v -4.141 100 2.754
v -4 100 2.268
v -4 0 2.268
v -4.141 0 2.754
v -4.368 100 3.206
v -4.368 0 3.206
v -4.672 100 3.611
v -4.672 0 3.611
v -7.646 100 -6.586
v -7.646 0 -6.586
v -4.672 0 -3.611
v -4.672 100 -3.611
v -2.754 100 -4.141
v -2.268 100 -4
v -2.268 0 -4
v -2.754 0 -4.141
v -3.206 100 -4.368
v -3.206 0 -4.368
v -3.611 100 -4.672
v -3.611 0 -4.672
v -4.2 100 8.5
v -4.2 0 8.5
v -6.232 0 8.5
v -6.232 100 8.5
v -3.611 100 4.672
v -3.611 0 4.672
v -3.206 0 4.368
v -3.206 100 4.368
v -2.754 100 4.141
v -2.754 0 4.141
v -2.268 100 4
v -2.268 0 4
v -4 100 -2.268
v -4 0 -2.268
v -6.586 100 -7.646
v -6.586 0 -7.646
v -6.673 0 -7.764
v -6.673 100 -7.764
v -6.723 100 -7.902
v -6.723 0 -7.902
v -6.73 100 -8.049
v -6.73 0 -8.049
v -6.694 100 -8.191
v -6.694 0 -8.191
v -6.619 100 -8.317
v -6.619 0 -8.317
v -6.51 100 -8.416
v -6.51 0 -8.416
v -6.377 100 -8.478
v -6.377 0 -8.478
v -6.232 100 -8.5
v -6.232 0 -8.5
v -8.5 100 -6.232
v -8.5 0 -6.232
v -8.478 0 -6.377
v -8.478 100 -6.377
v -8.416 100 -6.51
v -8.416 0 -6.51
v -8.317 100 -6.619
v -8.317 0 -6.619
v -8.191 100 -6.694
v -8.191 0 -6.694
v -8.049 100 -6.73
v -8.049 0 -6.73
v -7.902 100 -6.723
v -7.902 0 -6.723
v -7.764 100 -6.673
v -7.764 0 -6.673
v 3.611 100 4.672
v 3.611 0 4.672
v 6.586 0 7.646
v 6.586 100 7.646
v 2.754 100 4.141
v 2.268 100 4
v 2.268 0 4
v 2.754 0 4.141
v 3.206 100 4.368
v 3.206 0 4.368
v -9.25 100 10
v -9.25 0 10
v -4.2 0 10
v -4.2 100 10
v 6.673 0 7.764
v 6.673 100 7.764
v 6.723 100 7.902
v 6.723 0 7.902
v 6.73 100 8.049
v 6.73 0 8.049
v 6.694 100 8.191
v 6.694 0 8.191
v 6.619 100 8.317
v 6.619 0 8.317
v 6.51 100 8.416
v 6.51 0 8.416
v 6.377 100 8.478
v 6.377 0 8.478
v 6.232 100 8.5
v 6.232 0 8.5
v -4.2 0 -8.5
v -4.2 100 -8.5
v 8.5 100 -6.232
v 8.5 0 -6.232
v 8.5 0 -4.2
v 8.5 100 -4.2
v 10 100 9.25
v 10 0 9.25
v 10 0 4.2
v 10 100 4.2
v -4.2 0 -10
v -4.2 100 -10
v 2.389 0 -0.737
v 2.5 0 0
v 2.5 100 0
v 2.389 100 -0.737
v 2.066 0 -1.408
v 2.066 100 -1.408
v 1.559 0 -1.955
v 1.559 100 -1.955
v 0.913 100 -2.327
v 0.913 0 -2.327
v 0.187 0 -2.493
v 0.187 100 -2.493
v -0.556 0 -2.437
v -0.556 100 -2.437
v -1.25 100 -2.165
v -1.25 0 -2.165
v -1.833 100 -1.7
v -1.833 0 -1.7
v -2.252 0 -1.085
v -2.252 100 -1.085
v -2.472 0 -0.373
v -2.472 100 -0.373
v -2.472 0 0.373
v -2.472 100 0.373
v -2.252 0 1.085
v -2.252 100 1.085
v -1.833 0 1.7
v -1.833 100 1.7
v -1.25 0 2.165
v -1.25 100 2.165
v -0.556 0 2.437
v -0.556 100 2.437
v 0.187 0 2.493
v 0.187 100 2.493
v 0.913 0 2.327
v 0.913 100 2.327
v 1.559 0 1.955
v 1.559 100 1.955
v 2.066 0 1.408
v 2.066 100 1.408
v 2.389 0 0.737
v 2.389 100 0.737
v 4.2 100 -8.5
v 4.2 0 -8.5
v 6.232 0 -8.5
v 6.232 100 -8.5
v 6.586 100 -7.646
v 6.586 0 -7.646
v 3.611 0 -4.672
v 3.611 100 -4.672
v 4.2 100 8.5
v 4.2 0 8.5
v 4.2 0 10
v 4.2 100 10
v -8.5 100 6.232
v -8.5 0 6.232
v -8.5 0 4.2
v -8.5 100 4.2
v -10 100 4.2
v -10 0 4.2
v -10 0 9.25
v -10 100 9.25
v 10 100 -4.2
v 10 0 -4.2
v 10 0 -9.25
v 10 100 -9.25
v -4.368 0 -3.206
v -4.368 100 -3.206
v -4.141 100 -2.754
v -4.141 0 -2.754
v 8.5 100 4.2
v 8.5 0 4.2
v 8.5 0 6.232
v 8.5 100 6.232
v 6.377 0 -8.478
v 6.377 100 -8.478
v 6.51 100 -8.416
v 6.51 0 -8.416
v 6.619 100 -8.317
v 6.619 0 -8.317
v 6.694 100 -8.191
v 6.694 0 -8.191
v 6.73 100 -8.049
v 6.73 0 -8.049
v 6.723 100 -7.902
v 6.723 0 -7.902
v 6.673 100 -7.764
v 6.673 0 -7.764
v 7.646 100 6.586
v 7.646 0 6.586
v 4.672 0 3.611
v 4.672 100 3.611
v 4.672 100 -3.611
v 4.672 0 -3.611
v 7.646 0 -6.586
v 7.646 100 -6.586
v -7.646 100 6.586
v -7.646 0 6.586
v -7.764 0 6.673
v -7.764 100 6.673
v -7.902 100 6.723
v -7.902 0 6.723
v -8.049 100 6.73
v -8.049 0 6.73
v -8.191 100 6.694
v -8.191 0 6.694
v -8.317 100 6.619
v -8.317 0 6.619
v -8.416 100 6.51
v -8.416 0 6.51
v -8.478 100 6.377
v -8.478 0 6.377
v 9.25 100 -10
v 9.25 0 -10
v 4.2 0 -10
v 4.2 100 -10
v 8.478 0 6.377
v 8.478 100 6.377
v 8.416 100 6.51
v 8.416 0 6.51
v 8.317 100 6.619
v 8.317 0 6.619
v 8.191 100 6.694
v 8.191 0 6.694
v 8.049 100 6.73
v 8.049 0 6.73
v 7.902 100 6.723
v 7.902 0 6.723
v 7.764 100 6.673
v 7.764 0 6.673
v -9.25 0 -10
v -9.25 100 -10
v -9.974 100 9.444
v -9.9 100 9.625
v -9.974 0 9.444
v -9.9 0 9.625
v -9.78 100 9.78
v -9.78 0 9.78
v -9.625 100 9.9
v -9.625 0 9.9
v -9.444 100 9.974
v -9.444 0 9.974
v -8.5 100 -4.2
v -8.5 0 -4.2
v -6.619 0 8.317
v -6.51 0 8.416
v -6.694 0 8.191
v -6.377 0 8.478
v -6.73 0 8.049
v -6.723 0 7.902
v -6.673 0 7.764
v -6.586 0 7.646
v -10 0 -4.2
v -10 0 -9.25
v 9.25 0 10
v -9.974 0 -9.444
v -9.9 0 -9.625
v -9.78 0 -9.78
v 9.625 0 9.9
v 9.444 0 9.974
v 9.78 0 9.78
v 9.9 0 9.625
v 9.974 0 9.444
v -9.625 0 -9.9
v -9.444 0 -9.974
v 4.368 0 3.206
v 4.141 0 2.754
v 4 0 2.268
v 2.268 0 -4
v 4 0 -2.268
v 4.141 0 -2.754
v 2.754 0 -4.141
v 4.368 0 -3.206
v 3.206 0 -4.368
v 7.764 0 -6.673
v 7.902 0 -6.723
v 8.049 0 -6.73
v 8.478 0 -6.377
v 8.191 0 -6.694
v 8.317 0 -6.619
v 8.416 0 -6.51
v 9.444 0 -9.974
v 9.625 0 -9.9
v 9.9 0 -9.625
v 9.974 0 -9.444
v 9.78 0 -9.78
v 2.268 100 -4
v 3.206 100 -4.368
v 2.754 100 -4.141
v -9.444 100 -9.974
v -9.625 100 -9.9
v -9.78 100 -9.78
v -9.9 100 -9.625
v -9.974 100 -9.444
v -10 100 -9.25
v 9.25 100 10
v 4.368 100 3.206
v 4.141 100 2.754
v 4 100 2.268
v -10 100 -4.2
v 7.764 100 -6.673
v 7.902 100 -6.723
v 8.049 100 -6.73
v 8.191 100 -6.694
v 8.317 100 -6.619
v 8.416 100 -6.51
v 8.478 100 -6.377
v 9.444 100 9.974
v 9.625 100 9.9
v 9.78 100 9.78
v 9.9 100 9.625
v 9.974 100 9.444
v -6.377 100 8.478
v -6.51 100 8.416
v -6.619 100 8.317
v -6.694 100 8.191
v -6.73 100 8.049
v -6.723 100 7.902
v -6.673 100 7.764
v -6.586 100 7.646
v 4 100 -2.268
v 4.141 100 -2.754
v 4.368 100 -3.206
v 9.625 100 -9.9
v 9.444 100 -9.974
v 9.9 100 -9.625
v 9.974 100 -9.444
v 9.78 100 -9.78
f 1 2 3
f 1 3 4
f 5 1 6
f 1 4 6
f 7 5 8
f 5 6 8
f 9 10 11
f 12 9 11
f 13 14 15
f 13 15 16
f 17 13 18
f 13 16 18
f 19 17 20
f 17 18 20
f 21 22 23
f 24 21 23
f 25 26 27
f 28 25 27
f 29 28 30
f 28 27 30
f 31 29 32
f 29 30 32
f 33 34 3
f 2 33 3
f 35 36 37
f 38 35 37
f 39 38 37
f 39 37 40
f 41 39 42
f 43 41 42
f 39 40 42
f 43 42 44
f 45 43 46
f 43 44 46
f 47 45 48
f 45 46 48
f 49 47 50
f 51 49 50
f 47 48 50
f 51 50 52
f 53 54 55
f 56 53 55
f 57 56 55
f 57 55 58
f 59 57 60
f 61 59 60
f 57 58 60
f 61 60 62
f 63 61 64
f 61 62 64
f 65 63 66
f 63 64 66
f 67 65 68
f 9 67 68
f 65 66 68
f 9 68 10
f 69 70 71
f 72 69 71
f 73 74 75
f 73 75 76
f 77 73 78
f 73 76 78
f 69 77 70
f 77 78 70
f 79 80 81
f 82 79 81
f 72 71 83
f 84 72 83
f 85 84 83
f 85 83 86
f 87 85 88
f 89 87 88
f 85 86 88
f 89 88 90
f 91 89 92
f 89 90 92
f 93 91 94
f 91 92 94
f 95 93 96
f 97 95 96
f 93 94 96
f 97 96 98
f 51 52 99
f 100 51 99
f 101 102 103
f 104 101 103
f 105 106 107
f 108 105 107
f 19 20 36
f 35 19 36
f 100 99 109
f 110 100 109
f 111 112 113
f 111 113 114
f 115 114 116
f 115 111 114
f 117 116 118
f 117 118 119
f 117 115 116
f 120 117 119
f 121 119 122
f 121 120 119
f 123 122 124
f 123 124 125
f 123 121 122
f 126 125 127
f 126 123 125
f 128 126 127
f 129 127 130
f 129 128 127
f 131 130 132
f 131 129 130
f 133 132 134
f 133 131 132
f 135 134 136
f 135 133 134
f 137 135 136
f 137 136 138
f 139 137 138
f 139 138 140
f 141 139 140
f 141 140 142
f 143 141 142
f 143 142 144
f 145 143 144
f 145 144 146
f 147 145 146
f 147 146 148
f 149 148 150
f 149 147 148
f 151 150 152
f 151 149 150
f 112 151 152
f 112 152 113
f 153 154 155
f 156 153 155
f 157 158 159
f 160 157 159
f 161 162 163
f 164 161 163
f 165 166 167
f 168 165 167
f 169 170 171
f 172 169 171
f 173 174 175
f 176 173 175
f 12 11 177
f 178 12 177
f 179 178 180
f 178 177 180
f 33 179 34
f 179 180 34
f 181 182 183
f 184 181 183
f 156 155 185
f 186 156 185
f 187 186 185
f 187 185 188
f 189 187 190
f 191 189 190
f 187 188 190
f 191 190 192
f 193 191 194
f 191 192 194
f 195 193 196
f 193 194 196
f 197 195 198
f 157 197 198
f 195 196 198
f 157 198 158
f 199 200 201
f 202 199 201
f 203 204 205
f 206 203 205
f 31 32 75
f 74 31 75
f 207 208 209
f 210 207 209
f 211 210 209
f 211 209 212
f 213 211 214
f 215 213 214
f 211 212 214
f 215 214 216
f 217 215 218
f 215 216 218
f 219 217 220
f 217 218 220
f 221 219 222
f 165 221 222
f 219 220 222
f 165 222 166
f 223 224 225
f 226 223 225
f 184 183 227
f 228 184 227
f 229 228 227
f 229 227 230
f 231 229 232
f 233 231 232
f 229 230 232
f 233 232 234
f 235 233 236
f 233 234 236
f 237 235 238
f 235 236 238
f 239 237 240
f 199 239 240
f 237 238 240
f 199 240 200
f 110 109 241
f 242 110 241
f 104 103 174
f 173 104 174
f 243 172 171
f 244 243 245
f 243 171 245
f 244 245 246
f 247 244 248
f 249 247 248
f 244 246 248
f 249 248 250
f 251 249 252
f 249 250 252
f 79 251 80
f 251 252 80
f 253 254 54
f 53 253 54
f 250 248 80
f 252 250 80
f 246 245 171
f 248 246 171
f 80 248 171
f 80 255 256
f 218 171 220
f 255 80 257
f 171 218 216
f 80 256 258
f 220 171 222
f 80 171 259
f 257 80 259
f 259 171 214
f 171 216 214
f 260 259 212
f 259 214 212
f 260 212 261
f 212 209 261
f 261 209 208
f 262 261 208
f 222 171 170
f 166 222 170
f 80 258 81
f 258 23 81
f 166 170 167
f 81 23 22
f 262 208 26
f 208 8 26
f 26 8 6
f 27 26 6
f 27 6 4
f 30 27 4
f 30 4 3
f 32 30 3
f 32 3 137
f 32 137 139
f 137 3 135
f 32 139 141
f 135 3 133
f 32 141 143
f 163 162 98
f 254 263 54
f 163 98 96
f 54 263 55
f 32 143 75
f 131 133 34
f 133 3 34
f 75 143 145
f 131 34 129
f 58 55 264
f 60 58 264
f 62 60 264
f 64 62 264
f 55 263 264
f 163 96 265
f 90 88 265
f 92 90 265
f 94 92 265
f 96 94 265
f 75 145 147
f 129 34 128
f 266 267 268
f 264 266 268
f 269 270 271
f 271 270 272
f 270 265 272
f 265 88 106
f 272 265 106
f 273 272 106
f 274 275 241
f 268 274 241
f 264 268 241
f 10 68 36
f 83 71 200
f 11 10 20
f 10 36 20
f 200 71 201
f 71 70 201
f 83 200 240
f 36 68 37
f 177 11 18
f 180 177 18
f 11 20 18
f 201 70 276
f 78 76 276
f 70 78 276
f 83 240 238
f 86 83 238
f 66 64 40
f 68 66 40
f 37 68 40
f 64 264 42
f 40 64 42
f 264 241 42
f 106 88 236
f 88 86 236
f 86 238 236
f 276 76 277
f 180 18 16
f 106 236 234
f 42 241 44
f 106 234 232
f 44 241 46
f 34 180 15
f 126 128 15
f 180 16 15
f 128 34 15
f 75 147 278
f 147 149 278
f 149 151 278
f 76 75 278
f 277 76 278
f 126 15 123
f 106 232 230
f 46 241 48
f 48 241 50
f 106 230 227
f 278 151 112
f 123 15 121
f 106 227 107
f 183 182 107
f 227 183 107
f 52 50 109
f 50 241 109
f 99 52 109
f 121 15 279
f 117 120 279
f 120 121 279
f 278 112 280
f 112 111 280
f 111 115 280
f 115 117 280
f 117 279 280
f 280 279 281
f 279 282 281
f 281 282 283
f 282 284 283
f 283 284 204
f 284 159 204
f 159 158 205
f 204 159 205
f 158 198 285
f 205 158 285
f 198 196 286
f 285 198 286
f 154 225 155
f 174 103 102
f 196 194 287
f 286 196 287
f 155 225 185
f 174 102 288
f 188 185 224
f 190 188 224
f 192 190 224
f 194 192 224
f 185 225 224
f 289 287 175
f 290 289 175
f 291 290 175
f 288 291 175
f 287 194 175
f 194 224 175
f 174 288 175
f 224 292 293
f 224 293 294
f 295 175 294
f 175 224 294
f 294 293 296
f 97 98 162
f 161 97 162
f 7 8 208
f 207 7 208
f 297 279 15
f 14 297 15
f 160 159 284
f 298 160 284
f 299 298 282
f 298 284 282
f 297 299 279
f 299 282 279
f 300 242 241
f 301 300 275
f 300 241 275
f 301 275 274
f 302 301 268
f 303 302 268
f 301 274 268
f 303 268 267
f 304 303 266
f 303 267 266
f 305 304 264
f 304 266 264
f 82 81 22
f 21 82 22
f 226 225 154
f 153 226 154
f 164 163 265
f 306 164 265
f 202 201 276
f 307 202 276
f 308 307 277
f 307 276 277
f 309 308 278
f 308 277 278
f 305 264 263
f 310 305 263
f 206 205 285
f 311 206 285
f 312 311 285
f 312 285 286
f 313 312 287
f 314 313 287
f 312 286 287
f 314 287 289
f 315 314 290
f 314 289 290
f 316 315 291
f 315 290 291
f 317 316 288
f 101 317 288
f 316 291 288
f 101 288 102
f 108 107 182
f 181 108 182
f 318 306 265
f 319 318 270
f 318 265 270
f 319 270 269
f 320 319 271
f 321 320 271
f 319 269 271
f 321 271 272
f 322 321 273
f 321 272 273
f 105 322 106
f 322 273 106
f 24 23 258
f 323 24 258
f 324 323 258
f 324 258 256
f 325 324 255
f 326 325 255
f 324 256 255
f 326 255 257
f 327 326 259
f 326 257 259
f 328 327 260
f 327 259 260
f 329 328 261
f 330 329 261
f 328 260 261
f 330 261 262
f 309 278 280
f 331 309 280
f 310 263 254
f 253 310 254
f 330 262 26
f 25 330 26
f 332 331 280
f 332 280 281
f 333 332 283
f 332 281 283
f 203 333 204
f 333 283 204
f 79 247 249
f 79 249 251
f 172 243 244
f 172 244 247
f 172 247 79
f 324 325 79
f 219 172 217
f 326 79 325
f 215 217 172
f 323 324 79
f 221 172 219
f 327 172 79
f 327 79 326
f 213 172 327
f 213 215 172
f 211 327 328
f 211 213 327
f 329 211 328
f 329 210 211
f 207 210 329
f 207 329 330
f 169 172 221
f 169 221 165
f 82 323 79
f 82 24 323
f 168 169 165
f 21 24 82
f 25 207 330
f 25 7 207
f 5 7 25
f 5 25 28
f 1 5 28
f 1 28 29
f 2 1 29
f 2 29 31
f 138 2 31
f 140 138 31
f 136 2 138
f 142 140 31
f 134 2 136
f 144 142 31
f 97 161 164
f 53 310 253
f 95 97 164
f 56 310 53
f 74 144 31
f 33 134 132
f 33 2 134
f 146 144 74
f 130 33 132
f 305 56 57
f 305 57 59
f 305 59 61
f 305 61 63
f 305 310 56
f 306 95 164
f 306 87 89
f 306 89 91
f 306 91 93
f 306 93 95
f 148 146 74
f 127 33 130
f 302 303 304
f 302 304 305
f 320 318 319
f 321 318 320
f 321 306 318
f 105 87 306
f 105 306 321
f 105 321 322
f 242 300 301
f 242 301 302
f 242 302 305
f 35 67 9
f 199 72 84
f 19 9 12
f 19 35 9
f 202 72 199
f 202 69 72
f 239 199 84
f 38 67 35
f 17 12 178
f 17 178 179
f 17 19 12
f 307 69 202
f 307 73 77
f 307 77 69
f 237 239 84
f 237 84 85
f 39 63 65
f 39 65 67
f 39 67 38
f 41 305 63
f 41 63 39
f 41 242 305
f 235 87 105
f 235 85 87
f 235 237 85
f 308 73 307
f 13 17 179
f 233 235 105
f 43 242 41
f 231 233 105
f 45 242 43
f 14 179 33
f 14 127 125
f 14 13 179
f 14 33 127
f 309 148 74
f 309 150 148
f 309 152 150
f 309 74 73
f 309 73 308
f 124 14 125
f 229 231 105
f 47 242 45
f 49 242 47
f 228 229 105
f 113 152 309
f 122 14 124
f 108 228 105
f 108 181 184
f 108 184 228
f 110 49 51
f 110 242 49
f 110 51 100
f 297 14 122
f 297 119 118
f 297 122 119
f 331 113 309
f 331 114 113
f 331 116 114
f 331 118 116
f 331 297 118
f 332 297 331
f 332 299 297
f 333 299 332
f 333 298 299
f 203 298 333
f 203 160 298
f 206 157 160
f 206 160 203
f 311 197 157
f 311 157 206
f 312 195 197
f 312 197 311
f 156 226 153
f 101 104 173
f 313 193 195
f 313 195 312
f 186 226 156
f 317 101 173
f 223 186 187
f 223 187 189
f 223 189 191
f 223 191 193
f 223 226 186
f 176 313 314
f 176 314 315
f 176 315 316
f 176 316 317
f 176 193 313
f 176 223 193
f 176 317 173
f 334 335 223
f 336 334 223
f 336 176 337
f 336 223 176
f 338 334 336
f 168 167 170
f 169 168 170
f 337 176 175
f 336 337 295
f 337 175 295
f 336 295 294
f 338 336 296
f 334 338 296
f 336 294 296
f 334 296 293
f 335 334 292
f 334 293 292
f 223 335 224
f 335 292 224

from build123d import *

# Parameters (mm, degrees)
SKETCH1_R           = 2.5
BOSS_EXTRUDE1_DEPTH = 100


with BuildPart() as part:
    # Sketch1 → Boss-Extrude1 (new body)
    with BuildSketch(Plane(origin=(0, 0, 0), x_dir=(1, 0, 0), z_dir=(0, 1, 0))):
        with BuildLine():
            Line((-3.610984523, 4.671644695), (-6.585786438, 7.646446609))
            ThreePointArc((-6.585786438, 7.646446609), (-6.694172813, 8.191341716), (-6.232233047, 8.5))
            Line((-6.232233047, 8.5), (-4.2, 8.5))
            Line((-4.2, 8.5), (-4.2, 10))
            Line((-4.2, 10), (-9.25, 10))
            ThreePointArc((-9.25, 10), (-9.780330086, 9.780330086), (-10, 9.25))
            Line((-10, 9.25), (-10, 4.2))
            Line((-10, 4.2), (-8.5, 4.2))
            Line((-8.5, 4.2), (-8.5, 6.232233047))
            ThreePointArc((-8.5, 6.232233047), (-8.191341716, 6.694172813), (-7.646446609, 6.585786438))
            Line((-7.646446609, 6.585786438), (-4.671644695, 3.610984523))
            ThreePointArc((-4.671644695, 3.610984523), (-4.244383234, 2.985253206), (-4, 2.268058063))
            Line((-4, 2.268058063), (-4, -2.268058063))
            ThreePointArc((-4, -2.268058063), (-4.244383234, -2.985253206), (-4.671644695, -3.610984523))
            Line((-4.671644695, -3.610984523), (-7.646446609, -6.585786438))
            ThreePointArc((-7.646446609, -6.585786438), (-8.191341716, -6.694172813), (-8.5, -6.232233047))
            Line((-8.5, -6.232233047), (-8.5, -4.2))
            Line((-8.5, -4.2), (-10, -4.2))
            Line((-10, -4.2), (-10, -9.25))
            ThreePointArc((-10, -9.25), (-9.780330086, -9.780330086), (-9.25, -10))
            Line((-9.25, -10), (-4.2, -10))
            Line((-4.2, -10), (-4.2, -8.5))
            Line((-4.2, -8.5), (-6.232233047, -8.5))
            ThreePointArc((-6.232233047, -8.5), (-6.694172813, -8.191341716), (-6.585786438, -7.646446609))
            Line((-6.585786438, -7.646446609), (-3.610984523, -4.671644695))
            ThreePointArc((-3.610984523, -4.671644695), (-2.985253206, -4.244383234), (-2.268058063, -4))
            Line((-2.268058063, -4), (2.268058063, -4))
            ThreePointArc((2.268058063, -4), (2.985253206, -4.244383234), (3.610984523, -4.671644695))
            Line((3.610984523, -4.671644695), (6.585786438, -7.646446609))
            ThreePointArc((6.585786438, -7.646446609), (6.694172813, -8.191341716), (6.232233047, -8.5))
            Line((6.232233047, -8.5), (4.2, -8.5))
            Line((4.2, -8.5), (4.2, -10))
            Line((4.2, -10), (9.25, -10))
            ThreePointArc((9.25, -10), (9.780330086, -9.780330086), (10, -9.25))
            Line((10, -9.25), (10, -4.2))
            Line((10, -4.2), (8.5, -4.2))
            Line((8.5, -4.2), (8.5, -6.232233047))
            ThreePointArc((8.5, -6.232233047), (8.191341716, -6.694172813), (7.646446609, -6.585786438))
            Line((7.646446609, -6.585786438), (4.671644695, -3.610984523))
            ThreePointArc((4.671644695, -3.610984523), (4.244383234, -2.985253206), (4, -2.268058063))
            Line((4, -2.268058063), (4, 2.268058063))
            ThreePointArc((4, 2.268058063), (4.244383234, 2.985253206), (4.671644695, 3.610984523))
            Line((4.671644695, 3.610984523), (7.646446609, 6.585786438))
            ThreePointArc((7.646446609, 6.585786438), (8.191341716, 6.694172813), (8.5, 6.232233047))
            Line((8.5, 6.232233047), (8.5, 4.2))
            Line((8.5, 4.2), (10, 4.2))
            Line((10, 4.2), (10, 9.25))
            ThreePointArc((10, 9.25), (9.780330086, 9.780330086), (9.25, 10))
            Line((9.25, 10), (4.2, 10))
            Line((4.2, 10), (4.2, 8.5))
            Line((4.2, 8.5), (6.232233047, 8.5))
            ThreePointArc((6.232233047, 8.5), (6.694172813, 8.191341716), (6.585786438, 7.646446609))
            Line((6.585786438, 7.646446609), (3.610984523, 4.671644695))
            ThreePointArc((3.610984523, 4.671644695), (2.985253206, 4.244383234), (2.268058063, 4))
            Line((2.268058063, 4), (-2.268058063, 4))
            ThreePointArc((-2.268058063, 4), (-2.985253206, 4.244383234), (-3.610984523, 4.671644695))
        make_face()
        Circle(SKETCH1_R, mode=Mode.SUBTRACT)
    extrude(amount=BOSS_EXTRUDE1_DEPTH)


solid = part.part
